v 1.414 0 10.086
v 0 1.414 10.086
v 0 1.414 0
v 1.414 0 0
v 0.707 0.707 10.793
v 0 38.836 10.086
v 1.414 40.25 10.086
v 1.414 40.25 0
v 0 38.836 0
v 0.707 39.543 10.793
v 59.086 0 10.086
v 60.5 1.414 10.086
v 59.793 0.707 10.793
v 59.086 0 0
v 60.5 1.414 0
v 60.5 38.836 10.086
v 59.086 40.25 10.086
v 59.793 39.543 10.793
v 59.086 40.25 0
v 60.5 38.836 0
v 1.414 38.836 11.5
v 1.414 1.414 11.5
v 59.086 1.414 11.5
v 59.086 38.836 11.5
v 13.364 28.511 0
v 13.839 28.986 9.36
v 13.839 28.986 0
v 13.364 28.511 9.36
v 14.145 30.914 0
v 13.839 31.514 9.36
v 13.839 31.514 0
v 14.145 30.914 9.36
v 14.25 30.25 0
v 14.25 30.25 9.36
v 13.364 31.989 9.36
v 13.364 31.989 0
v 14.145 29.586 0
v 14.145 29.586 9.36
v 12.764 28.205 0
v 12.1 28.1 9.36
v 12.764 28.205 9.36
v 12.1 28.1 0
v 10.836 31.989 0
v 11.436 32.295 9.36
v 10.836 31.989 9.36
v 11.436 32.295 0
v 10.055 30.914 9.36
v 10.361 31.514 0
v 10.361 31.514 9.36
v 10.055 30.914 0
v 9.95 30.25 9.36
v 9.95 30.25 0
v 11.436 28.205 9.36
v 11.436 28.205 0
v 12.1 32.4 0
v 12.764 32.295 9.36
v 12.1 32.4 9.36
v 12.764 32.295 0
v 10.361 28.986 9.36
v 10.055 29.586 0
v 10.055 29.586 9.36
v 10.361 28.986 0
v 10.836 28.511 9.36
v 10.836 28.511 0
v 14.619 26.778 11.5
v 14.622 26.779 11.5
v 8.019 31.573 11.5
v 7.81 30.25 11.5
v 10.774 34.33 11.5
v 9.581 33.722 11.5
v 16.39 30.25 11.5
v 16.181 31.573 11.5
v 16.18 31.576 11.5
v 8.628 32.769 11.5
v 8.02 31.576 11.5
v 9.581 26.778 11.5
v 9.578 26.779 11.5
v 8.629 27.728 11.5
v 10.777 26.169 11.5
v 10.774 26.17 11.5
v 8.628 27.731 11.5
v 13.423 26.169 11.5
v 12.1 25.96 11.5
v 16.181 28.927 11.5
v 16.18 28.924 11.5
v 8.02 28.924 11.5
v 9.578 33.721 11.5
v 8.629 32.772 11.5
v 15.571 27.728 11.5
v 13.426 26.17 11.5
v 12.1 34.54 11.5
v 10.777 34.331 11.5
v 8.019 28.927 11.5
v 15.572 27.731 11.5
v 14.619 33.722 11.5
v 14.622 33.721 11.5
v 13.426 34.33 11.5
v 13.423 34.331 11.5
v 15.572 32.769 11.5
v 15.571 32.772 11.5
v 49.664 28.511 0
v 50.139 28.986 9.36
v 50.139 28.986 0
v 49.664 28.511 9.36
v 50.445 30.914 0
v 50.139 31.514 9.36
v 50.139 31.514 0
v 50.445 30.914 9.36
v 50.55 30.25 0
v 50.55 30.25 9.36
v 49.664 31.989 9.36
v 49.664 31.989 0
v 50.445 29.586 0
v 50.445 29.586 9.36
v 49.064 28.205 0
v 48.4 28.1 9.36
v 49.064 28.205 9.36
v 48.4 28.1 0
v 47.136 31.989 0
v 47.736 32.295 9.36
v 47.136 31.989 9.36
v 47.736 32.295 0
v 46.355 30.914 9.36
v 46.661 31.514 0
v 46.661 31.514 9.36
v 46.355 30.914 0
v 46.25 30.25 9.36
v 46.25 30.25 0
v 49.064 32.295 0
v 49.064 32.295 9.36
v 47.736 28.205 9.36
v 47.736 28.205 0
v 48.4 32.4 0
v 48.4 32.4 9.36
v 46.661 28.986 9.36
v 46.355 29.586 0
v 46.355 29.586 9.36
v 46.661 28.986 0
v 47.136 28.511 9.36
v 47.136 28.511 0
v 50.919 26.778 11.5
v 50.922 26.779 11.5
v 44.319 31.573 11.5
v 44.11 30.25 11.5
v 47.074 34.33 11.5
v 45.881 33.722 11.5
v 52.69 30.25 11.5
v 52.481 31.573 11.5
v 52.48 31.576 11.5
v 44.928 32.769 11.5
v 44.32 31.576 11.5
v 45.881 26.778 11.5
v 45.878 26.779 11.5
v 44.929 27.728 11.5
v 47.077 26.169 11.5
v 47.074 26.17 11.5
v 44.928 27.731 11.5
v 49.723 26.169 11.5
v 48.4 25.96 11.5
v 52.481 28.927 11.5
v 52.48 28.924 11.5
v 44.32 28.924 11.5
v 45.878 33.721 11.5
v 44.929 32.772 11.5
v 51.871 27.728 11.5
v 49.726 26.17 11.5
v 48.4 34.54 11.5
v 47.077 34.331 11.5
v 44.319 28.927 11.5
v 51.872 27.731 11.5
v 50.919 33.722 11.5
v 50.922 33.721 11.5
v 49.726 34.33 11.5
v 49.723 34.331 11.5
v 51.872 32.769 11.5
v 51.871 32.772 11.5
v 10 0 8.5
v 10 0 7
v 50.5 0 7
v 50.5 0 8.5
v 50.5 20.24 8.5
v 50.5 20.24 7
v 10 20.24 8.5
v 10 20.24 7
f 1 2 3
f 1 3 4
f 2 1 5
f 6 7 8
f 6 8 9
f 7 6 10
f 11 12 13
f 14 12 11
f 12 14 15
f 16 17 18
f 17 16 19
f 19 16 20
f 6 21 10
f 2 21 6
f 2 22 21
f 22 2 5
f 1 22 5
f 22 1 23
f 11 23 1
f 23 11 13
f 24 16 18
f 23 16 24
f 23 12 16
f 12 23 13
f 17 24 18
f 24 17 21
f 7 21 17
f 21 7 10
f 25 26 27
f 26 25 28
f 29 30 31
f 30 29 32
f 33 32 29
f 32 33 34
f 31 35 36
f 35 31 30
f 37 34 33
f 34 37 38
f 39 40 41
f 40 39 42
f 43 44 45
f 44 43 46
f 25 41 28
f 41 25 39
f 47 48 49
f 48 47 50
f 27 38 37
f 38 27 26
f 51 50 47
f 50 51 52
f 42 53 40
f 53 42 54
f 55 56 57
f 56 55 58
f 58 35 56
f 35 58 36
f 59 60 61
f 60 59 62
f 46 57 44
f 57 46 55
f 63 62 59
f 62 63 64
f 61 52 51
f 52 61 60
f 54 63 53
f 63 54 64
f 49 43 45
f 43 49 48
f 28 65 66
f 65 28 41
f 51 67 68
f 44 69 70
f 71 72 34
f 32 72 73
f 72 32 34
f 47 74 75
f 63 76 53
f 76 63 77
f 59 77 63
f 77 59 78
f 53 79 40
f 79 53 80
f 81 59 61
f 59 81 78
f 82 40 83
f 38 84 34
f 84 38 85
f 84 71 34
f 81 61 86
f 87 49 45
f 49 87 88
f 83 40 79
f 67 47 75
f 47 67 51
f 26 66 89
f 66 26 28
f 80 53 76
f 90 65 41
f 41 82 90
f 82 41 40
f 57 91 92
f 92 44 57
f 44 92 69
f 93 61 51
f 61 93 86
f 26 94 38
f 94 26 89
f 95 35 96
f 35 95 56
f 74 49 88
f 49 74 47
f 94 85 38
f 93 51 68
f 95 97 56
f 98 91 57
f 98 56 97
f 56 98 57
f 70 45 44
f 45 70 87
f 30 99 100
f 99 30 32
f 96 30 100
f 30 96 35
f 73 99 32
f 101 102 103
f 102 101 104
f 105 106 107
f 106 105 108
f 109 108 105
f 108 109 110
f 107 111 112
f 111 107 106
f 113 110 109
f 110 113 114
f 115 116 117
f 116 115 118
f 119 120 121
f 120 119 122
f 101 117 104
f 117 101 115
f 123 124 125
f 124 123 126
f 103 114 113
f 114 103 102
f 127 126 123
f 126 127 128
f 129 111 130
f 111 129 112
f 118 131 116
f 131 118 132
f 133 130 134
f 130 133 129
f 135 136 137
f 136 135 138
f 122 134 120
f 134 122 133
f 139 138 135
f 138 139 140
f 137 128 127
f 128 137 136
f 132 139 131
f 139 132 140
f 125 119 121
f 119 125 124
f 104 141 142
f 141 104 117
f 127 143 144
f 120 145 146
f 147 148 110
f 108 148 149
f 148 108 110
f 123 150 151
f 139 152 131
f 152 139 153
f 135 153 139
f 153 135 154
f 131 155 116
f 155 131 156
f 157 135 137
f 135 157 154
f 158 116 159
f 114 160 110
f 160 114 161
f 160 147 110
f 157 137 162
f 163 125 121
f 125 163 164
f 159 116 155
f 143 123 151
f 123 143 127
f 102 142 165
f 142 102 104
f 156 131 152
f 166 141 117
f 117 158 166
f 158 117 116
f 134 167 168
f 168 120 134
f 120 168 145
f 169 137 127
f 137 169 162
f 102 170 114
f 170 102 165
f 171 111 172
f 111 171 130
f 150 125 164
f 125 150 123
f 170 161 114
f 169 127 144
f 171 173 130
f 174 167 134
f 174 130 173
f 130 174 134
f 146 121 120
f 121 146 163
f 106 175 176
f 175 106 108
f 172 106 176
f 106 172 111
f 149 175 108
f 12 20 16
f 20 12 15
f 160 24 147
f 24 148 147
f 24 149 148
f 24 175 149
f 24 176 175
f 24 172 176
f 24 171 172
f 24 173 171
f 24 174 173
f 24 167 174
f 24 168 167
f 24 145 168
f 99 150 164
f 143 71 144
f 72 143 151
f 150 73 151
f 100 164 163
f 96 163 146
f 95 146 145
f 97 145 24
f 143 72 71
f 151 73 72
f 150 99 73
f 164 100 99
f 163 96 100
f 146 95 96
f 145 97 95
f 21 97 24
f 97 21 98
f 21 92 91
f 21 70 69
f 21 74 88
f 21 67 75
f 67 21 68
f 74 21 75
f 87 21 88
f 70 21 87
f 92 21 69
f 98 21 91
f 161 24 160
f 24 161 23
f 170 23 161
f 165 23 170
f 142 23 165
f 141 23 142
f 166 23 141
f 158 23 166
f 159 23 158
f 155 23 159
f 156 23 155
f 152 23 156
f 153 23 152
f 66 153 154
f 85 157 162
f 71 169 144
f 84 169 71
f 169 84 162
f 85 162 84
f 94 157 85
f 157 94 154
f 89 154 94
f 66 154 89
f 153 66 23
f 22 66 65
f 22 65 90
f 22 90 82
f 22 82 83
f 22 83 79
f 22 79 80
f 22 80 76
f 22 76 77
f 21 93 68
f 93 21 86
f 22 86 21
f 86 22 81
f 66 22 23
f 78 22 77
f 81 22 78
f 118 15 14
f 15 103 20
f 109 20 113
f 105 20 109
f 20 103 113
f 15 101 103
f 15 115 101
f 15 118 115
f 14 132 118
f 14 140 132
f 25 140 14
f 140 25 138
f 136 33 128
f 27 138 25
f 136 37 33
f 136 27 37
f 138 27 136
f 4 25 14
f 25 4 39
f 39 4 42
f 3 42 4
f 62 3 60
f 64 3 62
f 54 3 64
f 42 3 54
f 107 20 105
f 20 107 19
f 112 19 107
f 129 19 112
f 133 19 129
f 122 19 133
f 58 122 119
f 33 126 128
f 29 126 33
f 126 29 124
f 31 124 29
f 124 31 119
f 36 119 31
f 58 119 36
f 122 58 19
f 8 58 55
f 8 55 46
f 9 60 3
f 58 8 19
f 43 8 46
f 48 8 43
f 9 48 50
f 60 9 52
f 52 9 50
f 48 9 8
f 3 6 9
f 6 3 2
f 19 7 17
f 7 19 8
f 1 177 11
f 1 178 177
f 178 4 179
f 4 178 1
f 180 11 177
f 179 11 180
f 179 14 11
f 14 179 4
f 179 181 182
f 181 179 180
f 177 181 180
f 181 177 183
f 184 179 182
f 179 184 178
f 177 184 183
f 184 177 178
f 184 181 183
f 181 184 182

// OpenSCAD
// Tape measure mounting block for 40mm x 1.5mm galv

BAR_WIDTH = 40 + 0.5;
BAR_THICKNESS = 1.2 + 0.3;
SIDE_WIDTH = 10;
END_LENGTH = 20;
GAP = 7;
WALL = 3;

BLOCK_WIDTH = BAR_WIDTH + SIDE_WIDTH * 2;
BLOCK_LENGTH = END_LENGTH + BAR_WIDTH/2;

BLOCK_THICKNESS = GAP + BAR_THICKNESS + WALL;

SCREW_DIA = 4.3;

tiny = 0.01;
$fn = 20;

difference() {
  cube([BLOCK_WIDTH, BLOCK_LENGTH, BLOCK_THICKNESS]);
  ChamferVerticalCorners(BLOCK_WIDTH, BLOCK_LENGTH, BLOCK_THICKNESS);
  ChamferTopEdges(BLOCK_WIDTH, BLOCK_LENGTH, BLOCK_THICKNESS);
  // Bar slot
  translate([SIDE_WIDTH, -tiny, GAP]) cube([BAR_WIDTH, BLOCK_LENGTH - END_LENGTH, BAR_THICKNESS]);
  
  // Screw holes
  for (x=[BLOCK_WIDTH*0.2,BLOCK_WIDTH*0.8]) {
    translate([x, BLOCK_LENGTH - END_LENGTH/2, 0]) {
      translate([0,0,-tiny]) cylinder(d=SCREW_DIA,h=50);
      translate([0,0,BLOCK_THICKNESS-SCREW_DIA/2+tiny]) cylinder(r1=SCREW_DIA/2,r2=SCREW_DIA,h=SCREW_DIA/2);
    }
  } 
}

module ChamferVerticalCorners(x,y,z,size=2) {
  for (a=[0:x:x]) {
    for (b=[0:y:y]) {
      translate([a,b,0]) rotate([0,0,-45]) cube([size,size,z * 3], center=true);
    }
  }
}

module ChamferTopEdges(x,y,z,size=2) {
  for (a=[0:1]) {
    translate([a*x,y/2,z]) rotate([90,45,0]) cube([size,size,y], center=true);
    translate([x/2,a*y,z]) rotate([45,0,0]) rotate([0,90,0]) cube([size,size,x], center=true);
  }
}
